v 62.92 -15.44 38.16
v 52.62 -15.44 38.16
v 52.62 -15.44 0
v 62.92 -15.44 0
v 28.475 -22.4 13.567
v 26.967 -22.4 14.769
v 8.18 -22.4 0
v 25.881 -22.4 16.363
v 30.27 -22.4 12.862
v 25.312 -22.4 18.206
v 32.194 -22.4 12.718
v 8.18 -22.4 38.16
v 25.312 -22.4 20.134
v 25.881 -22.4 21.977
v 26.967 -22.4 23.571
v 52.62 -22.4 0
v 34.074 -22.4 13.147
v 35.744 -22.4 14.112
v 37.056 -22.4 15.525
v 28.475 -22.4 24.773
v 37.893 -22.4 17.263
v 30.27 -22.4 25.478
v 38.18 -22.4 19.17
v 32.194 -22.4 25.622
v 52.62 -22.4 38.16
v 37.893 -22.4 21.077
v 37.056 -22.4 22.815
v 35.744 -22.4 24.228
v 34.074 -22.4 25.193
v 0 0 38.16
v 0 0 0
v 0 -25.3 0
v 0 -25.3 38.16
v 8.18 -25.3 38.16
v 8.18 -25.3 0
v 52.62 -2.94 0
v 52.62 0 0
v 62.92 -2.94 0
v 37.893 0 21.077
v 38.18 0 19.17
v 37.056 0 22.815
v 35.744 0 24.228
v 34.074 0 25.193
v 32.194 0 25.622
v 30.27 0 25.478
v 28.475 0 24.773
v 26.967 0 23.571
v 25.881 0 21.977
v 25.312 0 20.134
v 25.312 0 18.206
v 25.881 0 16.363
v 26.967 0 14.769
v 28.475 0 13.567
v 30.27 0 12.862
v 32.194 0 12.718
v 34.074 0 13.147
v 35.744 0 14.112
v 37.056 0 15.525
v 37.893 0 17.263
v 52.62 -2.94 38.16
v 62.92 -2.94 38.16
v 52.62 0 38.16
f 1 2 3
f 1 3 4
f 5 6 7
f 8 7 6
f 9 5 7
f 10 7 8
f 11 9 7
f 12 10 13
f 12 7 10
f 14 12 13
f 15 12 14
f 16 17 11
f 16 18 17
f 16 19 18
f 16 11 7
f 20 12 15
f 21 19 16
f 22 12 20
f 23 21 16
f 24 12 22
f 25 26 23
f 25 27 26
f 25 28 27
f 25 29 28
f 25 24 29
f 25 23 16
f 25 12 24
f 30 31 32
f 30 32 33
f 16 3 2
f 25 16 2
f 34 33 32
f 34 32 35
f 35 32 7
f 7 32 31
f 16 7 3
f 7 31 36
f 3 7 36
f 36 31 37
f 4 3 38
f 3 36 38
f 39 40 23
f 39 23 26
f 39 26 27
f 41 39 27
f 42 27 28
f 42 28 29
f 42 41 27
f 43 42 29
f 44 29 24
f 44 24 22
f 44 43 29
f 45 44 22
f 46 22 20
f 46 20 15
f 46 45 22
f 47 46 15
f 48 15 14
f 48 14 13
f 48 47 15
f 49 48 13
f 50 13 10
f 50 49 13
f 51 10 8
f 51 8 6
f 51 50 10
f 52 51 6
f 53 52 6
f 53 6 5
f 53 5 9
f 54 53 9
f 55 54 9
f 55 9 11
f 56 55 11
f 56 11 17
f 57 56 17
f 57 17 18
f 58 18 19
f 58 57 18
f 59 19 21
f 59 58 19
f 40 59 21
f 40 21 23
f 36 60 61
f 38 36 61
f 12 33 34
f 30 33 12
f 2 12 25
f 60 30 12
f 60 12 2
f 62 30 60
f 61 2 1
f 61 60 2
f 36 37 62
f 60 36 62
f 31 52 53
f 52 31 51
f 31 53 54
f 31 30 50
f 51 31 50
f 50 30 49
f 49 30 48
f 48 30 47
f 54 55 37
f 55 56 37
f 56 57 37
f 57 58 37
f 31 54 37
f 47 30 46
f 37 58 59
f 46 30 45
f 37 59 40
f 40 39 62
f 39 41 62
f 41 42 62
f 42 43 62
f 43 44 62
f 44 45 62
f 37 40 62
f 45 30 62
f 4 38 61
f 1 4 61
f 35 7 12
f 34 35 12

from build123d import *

# Parameters (mm, degrees)
F0_W     = 8.18
F0_H     = 38.16
F1_DEPTH = 25.3
F0_W_2   = 44.44
F0_R     = 6.47
F2_DEPTH = 22.4
F3_START = 2.94
F0_W_3   = 10.3
F3_DEPTH = 12.5


with BuildPart() as f1:
    # F0 (on Front) → F1 (new body)
    with BuildSketch(Plane.XZ):
        with Locations((4.09, 19.08)):
            Rectangle(F0_W, F0_H)
    extrude(amount=F1_DEPTH)

    # F0 (on Front) → F2 (join)
    with BuildSketch(Plane.XZ):
        with Locations((30.4, 19.08)):
            Rectangle(F0_W_2, F0_H)
        with Locations((31.71, 19.17)):
            Circle(F0_R, mode=Mode.SUBTRACT)
    extrude(amount=F2_DEPTH)

    # F0 (on Front) → F3 (join)
    with BuildSketch(Plane.XZ.offset(F3_START)):
        with Locations((57.77, 19.08)):
            Rectangle(F0_W_3, F0_H)
    extrude(amount=F3_DEPTH)


solid = f1.part
